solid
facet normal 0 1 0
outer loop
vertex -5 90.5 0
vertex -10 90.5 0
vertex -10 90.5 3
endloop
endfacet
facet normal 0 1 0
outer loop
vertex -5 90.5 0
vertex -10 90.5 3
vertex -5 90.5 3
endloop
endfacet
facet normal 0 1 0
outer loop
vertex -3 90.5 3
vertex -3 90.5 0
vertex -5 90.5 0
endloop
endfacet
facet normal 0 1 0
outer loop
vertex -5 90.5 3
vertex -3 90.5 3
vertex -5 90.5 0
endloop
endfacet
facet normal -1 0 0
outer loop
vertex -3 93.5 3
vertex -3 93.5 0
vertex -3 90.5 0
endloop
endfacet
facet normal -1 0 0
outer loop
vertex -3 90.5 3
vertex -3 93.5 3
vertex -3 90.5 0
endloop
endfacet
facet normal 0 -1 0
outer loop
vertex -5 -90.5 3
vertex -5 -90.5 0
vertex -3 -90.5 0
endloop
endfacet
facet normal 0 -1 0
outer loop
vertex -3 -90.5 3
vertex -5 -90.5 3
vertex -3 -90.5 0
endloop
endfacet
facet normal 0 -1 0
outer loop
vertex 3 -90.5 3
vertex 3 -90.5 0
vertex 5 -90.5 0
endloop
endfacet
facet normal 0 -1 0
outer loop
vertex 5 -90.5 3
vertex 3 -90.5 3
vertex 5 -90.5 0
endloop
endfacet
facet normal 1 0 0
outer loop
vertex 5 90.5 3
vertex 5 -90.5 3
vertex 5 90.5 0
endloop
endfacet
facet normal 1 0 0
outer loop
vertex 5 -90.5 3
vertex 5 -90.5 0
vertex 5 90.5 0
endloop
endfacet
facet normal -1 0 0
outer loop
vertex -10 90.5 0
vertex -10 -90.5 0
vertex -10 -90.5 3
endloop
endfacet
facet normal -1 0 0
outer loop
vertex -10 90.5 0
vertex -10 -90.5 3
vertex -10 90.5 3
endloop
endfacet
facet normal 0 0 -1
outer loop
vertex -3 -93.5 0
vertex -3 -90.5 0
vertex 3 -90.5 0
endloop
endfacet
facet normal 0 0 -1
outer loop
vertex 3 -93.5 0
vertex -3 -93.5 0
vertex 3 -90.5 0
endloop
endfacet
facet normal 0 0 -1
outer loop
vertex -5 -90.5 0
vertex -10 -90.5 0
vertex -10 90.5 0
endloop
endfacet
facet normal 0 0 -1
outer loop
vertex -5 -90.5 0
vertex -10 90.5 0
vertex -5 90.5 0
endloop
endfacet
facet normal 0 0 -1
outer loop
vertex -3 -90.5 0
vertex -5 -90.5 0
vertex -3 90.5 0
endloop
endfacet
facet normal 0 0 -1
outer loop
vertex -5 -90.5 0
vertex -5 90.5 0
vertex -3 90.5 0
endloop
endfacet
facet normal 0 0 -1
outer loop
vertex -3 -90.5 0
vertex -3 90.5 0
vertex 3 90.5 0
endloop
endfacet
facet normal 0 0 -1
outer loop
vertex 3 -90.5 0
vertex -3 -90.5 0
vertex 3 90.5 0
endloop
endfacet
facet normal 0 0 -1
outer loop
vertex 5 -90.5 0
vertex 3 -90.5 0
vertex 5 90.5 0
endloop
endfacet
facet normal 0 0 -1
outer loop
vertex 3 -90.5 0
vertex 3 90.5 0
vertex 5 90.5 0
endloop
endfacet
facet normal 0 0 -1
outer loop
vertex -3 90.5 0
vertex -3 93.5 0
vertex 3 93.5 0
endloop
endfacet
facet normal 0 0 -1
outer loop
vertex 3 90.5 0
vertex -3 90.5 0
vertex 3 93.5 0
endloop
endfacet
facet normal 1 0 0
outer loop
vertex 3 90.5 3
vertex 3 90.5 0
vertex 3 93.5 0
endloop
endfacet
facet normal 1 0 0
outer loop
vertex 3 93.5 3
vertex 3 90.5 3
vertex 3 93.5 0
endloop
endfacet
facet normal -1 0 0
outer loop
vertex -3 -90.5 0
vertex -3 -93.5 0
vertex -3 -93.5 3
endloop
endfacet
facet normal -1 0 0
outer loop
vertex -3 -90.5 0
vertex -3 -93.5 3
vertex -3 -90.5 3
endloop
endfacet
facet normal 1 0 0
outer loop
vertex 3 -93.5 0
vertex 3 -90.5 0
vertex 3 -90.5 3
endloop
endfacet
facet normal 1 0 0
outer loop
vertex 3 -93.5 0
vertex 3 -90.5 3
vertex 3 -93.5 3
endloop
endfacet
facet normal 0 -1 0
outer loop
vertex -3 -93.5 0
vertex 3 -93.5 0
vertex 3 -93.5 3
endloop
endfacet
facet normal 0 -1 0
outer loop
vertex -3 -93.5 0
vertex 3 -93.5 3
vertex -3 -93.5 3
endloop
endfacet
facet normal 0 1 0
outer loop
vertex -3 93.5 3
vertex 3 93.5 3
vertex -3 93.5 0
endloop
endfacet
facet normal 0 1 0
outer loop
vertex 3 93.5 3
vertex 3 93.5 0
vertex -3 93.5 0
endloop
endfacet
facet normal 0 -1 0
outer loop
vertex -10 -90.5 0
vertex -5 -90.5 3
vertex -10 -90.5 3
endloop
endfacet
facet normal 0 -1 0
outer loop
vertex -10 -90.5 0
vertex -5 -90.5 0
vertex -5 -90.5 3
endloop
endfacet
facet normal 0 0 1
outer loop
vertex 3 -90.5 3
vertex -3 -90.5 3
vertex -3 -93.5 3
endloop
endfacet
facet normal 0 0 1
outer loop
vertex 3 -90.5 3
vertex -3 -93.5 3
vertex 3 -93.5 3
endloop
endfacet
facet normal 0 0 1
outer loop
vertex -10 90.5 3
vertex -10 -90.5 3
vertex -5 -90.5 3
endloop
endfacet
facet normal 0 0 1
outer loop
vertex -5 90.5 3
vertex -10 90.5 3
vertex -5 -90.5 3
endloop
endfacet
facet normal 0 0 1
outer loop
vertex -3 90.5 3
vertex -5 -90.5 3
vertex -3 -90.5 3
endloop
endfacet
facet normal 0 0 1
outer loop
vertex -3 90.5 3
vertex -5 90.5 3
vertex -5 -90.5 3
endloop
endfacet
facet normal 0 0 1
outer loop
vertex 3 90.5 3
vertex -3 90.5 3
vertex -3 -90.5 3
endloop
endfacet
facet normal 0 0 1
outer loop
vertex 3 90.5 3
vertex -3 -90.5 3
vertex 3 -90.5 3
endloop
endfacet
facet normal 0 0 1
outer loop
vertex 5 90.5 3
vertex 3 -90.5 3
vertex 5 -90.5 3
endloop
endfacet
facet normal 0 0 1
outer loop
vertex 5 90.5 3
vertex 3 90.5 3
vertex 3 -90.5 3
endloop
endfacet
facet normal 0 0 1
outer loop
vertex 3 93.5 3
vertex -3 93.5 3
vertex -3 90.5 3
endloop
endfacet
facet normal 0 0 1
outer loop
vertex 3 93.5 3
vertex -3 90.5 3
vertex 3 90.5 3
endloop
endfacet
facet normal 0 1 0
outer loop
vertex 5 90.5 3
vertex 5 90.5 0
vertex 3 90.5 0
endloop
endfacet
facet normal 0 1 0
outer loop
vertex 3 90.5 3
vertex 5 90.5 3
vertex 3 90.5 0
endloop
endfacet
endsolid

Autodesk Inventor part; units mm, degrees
ref_plane "YZ Plane" through (0, 0, 0) normal (1, 0, 0) x (0, 1, 0)
ref_plane "XZ Plane" through (0, 0, 0) normal (0, 1, 0) x (-1, 0, 0)
ref_plane "XY Plane" through (0, 0, 0) normal (0, 0, 1) x (1, 0, 0)
sketch "Sketch1" plane through (0, 0, 0) normal (0, 0, 1) x (1, 0, 0)
  line L0 (5, -90.5) -> (5, 90.5)
  line L1 (-5, -90.5) -> (5, 90.5) construction
  line L2 (5, -90.5) -> (-5, 90.5) construction
  line L3 (3, 90.5) -> (3, 93.5)
  line L4 (3, 93.5) -> (-3, 93.5)
  line L5 (-3, 93.5) -> (-3, 90.5)
  line L6 (5, 90.5) -> (3, 90.5)
  line L7 (-3, 90.5) -> (-5, 90.5)
  line L8 (3, -90.5) -> (3, -93.5)
  line L9 (3, -93.5) -> (-3, -93.5)
  line L10 (-3, -93.5) -> (-3, -90.5)
  line L11 (-5, -90.5) -> (-3, -90.5)
  line L12 (3, -90.5) -> (5, -90.5)
  line L13 (-5, -90.5) -> (-10, -90.5)
  line L14 (-10, -90.5) -> (-10, 90.5)
  line L15 (-10, 90.5) -> (-5, 90.5)
  point P0 (0, 0)
  dimension "d0" = 10
  dimension "d1" = 181
  dimension "d2" = 6
  dimension "d3" = 3
  dimension "d5" = 6
  dimension "d6" = 3
  dimension "d8" = 3.162
  dimension "d9" = 3.162
  dimension "d12" = 5
  dimension "d13" = 90
  dimension "d14" = 2
  dimension "d15" = 15
  dimension "d16" = 3
extrude "Extrusion1" add sketch "Sketch1" along normal blind 3
equation "\"BendRadius\" = Thickness"
equation "\"BendReliefWidth\" = Thickness"
equation "\"BendReliefDepth\" = 0.5 * Thickness"
equation "\"CornerReliefSize\" = 4 * Thickness"
equation "\"MinimumRemnant\" = 2 * Thickness"
equation "\"TransitionRadius\" = BendRadius"
equation "\"JacobiRadiusSize\" = BendRadius"
equation "\"GapSize\" = Thickness"
equation "\"Thickness\" = 0.5"
properties part number "3 binnen dunne cover plaat"
